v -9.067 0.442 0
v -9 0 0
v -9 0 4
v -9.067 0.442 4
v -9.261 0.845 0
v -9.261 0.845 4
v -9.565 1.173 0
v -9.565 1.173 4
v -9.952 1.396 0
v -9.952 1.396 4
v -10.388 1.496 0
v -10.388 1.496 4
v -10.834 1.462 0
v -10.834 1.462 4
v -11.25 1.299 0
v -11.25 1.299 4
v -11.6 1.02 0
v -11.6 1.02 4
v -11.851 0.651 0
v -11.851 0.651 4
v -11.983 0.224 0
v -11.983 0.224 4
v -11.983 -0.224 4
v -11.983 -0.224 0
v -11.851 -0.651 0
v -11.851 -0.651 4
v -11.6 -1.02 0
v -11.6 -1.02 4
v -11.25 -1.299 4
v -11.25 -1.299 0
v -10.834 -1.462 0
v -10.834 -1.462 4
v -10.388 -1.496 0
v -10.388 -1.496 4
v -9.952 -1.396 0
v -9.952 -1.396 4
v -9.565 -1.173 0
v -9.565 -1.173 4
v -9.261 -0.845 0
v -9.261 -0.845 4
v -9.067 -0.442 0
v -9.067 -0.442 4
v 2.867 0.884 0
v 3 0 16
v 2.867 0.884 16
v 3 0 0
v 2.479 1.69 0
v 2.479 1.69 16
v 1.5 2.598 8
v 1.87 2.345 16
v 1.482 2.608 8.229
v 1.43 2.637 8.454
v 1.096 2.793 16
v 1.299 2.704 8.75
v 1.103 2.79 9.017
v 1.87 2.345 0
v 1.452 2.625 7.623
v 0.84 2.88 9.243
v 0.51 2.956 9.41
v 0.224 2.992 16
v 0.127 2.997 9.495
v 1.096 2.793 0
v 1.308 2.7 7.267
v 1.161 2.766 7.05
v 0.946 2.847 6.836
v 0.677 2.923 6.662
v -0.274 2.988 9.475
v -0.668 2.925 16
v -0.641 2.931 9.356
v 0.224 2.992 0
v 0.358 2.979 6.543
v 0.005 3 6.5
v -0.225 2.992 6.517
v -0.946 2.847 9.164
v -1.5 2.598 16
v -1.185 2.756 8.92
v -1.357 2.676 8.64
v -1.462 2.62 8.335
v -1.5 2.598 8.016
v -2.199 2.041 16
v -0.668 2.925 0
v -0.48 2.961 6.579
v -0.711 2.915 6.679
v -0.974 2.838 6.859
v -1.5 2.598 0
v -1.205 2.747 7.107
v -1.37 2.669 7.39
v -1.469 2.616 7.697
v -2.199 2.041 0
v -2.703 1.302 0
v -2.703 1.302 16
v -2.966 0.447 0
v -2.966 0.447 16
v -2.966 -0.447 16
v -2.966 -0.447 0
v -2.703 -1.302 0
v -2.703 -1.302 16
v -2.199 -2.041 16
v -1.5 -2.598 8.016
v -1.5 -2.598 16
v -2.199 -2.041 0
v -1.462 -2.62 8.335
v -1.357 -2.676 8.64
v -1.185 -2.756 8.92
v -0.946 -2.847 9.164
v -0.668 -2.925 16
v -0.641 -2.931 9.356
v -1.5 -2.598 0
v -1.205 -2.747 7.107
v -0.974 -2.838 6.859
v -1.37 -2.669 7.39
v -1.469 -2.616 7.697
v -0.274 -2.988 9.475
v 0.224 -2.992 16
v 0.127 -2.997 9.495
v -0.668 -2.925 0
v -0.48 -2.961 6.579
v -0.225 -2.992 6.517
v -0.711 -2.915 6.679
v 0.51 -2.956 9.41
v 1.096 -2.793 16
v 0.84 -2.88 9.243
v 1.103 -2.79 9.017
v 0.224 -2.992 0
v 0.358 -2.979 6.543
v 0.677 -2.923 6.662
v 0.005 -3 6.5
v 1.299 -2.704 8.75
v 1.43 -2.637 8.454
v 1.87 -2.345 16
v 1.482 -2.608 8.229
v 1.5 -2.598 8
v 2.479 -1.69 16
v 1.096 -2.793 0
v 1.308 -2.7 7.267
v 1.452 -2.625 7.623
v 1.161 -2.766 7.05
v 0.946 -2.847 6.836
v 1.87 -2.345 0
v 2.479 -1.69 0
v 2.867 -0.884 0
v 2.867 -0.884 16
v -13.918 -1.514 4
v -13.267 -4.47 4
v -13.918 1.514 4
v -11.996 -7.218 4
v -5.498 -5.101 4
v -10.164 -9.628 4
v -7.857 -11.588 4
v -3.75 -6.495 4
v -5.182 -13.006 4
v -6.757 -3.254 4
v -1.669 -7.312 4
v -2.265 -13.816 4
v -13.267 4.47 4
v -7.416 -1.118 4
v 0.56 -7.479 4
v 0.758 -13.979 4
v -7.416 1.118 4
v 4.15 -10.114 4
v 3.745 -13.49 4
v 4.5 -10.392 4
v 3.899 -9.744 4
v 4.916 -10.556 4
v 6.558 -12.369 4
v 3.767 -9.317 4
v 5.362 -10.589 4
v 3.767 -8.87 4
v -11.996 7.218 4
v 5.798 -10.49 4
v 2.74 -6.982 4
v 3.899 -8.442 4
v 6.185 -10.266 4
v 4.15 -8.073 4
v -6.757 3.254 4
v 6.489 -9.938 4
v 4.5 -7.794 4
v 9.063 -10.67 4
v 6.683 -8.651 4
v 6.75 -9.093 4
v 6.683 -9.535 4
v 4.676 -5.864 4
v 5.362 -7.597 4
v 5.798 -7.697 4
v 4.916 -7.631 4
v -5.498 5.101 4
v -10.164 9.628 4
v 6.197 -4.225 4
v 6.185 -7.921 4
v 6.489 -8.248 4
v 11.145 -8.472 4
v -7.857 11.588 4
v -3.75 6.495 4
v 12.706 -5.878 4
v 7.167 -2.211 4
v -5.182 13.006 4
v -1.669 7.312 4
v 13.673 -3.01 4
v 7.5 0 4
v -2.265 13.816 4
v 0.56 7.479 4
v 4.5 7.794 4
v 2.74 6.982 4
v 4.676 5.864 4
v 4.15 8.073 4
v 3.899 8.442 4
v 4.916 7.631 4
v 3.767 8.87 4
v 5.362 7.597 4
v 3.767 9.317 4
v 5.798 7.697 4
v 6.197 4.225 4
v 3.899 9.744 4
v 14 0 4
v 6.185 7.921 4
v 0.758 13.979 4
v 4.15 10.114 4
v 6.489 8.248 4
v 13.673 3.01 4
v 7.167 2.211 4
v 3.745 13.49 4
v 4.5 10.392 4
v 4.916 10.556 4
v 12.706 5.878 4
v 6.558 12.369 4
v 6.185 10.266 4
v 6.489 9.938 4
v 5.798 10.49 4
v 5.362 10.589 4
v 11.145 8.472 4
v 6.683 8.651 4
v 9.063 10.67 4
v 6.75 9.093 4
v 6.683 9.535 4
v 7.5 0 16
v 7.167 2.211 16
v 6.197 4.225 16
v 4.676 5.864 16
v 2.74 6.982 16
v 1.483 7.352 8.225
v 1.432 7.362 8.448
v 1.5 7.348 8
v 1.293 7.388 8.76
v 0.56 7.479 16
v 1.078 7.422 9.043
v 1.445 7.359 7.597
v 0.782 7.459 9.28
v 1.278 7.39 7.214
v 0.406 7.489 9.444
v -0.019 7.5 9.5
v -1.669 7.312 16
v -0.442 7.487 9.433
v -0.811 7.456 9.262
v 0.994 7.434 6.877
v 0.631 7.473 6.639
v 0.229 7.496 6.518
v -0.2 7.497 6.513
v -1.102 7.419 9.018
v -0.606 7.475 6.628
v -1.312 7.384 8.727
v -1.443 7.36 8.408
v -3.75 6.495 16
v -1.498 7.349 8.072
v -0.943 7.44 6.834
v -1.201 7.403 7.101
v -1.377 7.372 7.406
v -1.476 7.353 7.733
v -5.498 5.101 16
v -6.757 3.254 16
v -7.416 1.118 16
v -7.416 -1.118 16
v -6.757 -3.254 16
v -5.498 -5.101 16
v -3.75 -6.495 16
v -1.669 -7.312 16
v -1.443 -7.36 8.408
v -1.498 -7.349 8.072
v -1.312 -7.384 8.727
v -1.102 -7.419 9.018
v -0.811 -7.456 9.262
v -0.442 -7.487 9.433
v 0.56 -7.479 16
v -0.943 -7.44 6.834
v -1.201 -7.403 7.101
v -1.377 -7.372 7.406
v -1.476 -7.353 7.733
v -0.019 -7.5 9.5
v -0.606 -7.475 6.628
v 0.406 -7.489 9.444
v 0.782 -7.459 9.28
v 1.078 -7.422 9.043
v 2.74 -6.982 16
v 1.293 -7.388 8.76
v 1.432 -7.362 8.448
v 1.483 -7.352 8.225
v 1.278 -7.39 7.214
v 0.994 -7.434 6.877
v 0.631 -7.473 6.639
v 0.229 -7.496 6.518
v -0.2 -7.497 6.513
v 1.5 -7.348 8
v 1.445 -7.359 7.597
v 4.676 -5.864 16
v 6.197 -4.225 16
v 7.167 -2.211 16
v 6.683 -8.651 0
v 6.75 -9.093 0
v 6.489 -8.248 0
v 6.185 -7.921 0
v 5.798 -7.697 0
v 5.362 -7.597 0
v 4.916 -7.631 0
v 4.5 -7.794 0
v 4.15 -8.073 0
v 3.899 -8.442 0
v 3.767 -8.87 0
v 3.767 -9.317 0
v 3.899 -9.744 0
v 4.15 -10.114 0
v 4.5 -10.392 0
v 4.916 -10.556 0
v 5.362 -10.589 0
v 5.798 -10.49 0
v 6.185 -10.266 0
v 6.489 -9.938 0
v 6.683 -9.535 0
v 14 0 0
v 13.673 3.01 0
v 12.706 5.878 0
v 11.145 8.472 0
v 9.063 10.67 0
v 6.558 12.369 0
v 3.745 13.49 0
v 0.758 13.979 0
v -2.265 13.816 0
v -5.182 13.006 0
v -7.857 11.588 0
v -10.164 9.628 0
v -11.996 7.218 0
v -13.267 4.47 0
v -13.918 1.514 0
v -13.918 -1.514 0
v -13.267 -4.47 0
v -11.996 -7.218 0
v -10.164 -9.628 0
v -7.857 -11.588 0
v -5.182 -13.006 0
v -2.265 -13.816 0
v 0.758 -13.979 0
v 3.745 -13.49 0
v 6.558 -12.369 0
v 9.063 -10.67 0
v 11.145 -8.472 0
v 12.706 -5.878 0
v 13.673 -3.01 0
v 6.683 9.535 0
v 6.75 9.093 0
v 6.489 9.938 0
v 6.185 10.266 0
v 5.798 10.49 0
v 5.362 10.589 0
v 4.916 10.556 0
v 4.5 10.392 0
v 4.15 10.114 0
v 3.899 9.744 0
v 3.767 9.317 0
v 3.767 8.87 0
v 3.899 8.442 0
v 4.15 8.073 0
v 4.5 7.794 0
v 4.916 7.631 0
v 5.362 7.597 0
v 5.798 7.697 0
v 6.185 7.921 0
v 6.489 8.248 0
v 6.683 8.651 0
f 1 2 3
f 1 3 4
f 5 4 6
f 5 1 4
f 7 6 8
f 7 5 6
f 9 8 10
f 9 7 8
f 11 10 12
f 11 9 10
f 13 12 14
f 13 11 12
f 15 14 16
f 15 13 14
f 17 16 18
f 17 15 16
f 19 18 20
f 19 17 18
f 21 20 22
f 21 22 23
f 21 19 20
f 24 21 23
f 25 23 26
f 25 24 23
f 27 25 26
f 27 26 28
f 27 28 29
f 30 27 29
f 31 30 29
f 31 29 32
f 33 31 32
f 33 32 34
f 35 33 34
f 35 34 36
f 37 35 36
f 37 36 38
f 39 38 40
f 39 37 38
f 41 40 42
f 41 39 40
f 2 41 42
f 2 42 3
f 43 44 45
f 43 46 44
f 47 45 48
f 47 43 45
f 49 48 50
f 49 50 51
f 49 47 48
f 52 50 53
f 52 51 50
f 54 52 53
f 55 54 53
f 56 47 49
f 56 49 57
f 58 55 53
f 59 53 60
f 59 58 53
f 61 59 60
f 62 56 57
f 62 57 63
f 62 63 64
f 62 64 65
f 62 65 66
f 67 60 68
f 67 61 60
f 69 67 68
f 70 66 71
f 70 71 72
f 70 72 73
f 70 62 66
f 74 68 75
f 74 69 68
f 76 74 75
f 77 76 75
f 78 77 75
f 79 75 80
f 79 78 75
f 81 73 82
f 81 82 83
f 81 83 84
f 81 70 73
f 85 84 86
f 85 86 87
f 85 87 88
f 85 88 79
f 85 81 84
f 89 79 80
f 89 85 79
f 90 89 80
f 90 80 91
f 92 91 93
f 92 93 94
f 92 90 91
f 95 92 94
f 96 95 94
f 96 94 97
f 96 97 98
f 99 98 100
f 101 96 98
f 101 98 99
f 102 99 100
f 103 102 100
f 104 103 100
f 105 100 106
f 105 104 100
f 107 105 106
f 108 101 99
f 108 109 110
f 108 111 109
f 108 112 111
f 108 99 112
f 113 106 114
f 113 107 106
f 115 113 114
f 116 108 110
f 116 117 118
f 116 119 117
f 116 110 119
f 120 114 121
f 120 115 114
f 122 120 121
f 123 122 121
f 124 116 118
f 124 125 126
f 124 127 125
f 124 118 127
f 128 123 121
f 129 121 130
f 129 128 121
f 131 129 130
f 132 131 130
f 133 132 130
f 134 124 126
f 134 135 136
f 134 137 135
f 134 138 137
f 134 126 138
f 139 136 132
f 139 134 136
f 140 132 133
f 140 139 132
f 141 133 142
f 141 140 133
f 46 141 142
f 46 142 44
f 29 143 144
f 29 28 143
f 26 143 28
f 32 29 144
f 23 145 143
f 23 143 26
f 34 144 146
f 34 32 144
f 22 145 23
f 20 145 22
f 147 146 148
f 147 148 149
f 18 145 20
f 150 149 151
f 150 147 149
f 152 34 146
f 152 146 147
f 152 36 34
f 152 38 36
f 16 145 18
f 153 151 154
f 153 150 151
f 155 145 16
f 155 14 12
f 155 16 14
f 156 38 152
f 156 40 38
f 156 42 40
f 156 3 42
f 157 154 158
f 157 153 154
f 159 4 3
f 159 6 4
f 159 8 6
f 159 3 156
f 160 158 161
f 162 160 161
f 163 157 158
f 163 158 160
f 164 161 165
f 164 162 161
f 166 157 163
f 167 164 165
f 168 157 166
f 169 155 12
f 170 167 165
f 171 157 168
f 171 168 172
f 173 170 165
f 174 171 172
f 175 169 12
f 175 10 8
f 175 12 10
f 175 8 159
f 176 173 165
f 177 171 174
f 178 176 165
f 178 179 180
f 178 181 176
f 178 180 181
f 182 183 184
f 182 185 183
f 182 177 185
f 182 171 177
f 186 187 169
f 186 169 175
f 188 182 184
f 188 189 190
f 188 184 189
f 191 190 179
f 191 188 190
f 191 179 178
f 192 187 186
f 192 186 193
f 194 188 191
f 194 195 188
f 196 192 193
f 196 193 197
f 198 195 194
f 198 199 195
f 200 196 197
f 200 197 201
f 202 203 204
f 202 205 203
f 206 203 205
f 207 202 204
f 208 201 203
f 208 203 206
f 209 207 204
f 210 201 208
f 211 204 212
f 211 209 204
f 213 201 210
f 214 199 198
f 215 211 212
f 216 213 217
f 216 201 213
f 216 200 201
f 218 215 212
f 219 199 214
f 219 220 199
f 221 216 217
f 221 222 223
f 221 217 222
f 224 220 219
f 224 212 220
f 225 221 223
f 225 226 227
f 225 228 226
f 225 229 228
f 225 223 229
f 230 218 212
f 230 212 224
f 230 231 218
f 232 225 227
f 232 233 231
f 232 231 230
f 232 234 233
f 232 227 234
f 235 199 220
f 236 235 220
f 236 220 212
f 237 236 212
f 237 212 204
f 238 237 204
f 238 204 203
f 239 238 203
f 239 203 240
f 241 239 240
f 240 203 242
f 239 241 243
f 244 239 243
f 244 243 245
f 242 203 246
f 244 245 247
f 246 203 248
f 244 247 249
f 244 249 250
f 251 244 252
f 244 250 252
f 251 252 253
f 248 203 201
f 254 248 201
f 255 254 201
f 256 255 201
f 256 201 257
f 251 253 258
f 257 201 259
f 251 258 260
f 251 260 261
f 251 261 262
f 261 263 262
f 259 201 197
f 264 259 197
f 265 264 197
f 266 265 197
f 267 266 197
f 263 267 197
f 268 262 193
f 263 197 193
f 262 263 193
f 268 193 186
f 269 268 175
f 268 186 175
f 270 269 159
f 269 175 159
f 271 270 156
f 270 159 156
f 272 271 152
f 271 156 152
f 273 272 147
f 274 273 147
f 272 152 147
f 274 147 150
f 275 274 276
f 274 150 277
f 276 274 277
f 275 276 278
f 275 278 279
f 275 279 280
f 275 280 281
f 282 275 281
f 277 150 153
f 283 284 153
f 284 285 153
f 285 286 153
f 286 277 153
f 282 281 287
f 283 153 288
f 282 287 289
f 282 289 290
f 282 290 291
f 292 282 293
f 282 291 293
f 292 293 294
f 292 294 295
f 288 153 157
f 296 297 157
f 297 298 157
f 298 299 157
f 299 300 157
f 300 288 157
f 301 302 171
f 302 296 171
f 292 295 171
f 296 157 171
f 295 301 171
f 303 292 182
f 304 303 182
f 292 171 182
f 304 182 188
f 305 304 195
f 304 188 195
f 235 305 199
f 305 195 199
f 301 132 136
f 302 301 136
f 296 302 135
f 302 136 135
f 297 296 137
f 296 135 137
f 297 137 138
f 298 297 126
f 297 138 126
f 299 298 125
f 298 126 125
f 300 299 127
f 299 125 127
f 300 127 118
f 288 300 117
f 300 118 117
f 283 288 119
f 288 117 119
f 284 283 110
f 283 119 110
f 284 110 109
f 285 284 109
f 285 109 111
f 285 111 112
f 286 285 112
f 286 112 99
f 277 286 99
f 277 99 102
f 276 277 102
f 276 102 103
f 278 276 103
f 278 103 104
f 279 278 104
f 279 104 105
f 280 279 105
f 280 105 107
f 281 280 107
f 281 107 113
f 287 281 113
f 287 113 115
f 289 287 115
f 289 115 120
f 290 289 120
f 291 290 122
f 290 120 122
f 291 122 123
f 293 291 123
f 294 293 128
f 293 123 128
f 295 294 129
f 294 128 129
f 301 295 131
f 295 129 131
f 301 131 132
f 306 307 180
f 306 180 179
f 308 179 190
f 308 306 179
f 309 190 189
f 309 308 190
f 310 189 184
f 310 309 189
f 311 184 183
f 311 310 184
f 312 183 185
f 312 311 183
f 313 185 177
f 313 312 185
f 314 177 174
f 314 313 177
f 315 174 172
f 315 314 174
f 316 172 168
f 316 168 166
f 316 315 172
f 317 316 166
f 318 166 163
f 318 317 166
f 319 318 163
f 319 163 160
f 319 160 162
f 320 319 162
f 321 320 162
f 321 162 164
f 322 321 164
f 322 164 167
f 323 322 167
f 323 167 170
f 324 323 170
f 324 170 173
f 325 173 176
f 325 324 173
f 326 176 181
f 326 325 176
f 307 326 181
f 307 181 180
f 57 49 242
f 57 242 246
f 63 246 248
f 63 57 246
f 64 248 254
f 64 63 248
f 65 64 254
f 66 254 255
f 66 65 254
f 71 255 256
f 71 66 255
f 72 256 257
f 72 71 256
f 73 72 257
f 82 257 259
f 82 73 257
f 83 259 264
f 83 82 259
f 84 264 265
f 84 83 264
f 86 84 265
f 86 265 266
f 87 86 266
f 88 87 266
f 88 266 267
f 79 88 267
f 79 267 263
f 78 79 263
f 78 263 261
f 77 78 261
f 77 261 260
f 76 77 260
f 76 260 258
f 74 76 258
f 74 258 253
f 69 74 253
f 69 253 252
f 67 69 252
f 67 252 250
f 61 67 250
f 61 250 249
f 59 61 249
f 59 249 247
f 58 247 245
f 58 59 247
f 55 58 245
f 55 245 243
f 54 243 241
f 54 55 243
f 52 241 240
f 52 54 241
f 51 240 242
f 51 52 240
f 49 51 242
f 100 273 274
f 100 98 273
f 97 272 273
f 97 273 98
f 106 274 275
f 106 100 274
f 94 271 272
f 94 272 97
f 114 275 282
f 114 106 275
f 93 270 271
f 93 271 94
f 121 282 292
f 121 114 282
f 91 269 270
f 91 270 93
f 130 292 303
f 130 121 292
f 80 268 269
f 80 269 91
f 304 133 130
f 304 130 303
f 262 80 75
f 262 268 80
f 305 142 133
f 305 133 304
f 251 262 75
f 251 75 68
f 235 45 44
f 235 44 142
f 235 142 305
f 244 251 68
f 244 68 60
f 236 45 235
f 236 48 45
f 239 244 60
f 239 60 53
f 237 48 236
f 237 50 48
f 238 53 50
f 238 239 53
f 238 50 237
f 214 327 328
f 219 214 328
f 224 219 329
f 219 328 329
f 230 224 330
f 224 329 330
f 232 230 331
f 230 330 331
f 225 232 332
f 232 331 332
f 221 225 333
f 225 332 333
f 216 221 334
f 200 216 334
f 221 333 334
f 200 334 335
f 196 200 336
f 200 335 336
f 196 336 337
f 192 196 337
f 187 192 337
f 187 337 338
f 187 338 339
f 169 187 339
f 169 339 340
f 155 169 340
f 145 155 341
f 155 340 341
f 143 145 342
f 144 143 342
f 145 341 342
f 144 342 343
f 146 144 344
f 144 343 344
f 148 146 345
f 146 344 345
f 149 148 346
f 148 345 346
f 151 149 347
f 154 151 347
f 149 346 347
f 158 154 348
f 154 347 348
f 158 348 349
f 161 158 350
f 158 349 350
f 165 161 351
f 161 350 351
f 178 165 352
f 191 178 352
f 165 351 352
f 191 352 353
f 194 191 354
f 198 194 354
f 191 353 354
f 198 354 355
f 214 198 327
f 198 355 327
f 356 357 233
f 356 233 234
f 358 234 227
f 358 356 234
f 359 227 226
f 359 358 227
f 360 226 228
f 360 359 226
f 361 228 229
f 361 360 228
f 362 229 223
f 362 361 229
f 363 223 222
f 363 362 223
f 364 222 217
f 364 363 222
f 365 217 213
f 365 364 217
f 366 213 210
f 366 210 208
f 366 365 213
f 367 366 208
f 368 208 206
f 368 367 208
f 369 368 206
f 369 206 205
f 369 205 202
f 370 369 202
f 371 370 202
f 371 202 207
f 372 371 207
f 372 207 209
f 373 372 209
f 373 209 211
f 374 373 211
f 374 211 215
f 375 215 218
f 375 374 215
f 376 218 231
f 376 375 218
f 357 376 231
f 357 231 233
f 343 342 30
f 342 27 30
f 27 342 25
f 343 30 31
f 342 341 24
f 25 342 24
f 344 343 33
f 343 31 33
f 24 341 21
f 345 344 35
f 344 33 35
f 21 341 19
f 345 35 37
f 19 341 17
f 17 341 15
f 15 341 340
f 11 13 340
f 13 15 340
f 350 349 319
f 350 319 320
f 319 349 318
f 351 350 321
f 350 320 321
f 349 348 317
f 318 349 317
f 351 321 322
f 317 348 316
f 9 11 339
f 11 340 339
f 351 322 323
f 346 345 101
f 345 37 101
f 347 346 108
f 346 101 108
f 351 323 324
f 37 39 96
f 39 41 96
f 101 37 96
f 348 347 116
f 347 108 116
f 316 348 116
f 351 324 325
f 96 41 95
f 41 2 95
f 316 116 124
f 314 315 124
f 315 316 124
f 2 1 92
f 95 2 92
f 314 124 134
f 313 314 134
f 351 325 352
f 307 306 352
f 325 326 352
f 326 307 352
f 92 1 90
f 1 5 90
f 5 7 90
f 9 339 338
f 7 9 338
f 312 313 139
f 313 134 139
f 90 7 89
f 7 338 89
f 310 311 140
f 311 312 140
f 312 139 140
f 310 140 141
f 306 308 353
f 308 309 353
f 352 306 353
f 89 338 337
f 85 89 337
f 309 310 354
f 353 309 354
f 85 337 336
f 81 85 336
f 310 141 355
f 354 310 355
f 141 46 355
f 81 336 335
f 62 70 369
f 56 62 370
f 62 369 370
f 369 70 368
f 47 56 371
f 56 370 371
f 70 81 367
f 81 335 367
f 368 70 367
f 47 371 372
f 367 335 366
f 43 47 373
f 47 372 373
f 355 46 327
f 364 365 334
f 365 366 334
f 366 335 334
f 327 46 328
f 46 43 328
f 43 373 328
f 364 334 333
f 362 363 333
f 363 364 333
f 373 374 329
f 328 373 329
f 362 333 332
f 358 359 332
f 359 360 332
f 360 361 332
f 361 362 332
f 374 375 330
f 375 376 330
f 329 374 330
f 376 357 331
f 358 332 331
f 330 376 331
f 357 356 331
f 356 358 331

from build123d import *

# Parameters (mm, degrees)
SKETCH_1_R               = 14
SKETCH_1_R_2             = 1.5
SKETCH_1_R_3             = 3
EXTRUDE_1_DEPTH          = 4
SKETCH_3_R               = 7.5
SKETCH_3_R_2             = 3
EXTRUDE_2_DEPTH          = 12
SKETCH_4_R               = 1.5
CUT_EXTRUDE_1_DEPTH      = 15
CUT_EXTRUDE_1_DEPTH_BACK = 15


with BuildPart() as part:
    # ｽｹｯﾁ1 → ﾎﾞｽ - 押し出し1 (new body)
    with BuildSketch(Plane.XY):
        Circle(SKETCH_1_R)
        with Locations((-10.5, 0)):
            Circle(SKETCH_1_R_2, mode=Mode.SUBTRACT)
        with Locations((5.25, -9.09326674)):
            Circle(SKETCH_1_R_2, mode=Mode.SUBTRACT)
        with Locations((5.25, 9.09326674)):
            Circle(SKETCH_1_R_2, mode=Mode.SUBTRACT)
        Circle(SKETCH_1_R_3, mode=Mode.SUBTRACT)
    extrude(amount=EXTRUDE_1_DEPTH)

    # ｽｹｯﾁ3 → ﾎﾞｽ - 押し出し2 (add)
    with BuildSketch(Plane.XY.offset(4)):
        Circle(SKETCH_3_R)
        Circle(SKETCH_3_R_2, mode=Mode.SUBTRACT)
    extrude(amount=EXTRUDE_2_DEPTH)

    # ｽｹｯﾁ4 → ｶｯﾄ - 押し出し1 (cut, two sides)
    with BuildSketch(Plane(origin=(0, 0, 0), x_dir=(1, 0, 0), z_dir=(0, 1, 0))) as cut_extrude_1_sk:
        with Locations((0, -8)):
            Circle(SKETCH_4_R)
    extrude(amount=CUT_EXTRUDE_1_DEPTH, mode=Mode.SUBTRACT)
    extrude(cut_extrude_1_sk.sketch, amount=-CUT_EXTRUDE_1_DEPTH_BACK, mode=Mode.SUBTRACT)


solid = part.part
